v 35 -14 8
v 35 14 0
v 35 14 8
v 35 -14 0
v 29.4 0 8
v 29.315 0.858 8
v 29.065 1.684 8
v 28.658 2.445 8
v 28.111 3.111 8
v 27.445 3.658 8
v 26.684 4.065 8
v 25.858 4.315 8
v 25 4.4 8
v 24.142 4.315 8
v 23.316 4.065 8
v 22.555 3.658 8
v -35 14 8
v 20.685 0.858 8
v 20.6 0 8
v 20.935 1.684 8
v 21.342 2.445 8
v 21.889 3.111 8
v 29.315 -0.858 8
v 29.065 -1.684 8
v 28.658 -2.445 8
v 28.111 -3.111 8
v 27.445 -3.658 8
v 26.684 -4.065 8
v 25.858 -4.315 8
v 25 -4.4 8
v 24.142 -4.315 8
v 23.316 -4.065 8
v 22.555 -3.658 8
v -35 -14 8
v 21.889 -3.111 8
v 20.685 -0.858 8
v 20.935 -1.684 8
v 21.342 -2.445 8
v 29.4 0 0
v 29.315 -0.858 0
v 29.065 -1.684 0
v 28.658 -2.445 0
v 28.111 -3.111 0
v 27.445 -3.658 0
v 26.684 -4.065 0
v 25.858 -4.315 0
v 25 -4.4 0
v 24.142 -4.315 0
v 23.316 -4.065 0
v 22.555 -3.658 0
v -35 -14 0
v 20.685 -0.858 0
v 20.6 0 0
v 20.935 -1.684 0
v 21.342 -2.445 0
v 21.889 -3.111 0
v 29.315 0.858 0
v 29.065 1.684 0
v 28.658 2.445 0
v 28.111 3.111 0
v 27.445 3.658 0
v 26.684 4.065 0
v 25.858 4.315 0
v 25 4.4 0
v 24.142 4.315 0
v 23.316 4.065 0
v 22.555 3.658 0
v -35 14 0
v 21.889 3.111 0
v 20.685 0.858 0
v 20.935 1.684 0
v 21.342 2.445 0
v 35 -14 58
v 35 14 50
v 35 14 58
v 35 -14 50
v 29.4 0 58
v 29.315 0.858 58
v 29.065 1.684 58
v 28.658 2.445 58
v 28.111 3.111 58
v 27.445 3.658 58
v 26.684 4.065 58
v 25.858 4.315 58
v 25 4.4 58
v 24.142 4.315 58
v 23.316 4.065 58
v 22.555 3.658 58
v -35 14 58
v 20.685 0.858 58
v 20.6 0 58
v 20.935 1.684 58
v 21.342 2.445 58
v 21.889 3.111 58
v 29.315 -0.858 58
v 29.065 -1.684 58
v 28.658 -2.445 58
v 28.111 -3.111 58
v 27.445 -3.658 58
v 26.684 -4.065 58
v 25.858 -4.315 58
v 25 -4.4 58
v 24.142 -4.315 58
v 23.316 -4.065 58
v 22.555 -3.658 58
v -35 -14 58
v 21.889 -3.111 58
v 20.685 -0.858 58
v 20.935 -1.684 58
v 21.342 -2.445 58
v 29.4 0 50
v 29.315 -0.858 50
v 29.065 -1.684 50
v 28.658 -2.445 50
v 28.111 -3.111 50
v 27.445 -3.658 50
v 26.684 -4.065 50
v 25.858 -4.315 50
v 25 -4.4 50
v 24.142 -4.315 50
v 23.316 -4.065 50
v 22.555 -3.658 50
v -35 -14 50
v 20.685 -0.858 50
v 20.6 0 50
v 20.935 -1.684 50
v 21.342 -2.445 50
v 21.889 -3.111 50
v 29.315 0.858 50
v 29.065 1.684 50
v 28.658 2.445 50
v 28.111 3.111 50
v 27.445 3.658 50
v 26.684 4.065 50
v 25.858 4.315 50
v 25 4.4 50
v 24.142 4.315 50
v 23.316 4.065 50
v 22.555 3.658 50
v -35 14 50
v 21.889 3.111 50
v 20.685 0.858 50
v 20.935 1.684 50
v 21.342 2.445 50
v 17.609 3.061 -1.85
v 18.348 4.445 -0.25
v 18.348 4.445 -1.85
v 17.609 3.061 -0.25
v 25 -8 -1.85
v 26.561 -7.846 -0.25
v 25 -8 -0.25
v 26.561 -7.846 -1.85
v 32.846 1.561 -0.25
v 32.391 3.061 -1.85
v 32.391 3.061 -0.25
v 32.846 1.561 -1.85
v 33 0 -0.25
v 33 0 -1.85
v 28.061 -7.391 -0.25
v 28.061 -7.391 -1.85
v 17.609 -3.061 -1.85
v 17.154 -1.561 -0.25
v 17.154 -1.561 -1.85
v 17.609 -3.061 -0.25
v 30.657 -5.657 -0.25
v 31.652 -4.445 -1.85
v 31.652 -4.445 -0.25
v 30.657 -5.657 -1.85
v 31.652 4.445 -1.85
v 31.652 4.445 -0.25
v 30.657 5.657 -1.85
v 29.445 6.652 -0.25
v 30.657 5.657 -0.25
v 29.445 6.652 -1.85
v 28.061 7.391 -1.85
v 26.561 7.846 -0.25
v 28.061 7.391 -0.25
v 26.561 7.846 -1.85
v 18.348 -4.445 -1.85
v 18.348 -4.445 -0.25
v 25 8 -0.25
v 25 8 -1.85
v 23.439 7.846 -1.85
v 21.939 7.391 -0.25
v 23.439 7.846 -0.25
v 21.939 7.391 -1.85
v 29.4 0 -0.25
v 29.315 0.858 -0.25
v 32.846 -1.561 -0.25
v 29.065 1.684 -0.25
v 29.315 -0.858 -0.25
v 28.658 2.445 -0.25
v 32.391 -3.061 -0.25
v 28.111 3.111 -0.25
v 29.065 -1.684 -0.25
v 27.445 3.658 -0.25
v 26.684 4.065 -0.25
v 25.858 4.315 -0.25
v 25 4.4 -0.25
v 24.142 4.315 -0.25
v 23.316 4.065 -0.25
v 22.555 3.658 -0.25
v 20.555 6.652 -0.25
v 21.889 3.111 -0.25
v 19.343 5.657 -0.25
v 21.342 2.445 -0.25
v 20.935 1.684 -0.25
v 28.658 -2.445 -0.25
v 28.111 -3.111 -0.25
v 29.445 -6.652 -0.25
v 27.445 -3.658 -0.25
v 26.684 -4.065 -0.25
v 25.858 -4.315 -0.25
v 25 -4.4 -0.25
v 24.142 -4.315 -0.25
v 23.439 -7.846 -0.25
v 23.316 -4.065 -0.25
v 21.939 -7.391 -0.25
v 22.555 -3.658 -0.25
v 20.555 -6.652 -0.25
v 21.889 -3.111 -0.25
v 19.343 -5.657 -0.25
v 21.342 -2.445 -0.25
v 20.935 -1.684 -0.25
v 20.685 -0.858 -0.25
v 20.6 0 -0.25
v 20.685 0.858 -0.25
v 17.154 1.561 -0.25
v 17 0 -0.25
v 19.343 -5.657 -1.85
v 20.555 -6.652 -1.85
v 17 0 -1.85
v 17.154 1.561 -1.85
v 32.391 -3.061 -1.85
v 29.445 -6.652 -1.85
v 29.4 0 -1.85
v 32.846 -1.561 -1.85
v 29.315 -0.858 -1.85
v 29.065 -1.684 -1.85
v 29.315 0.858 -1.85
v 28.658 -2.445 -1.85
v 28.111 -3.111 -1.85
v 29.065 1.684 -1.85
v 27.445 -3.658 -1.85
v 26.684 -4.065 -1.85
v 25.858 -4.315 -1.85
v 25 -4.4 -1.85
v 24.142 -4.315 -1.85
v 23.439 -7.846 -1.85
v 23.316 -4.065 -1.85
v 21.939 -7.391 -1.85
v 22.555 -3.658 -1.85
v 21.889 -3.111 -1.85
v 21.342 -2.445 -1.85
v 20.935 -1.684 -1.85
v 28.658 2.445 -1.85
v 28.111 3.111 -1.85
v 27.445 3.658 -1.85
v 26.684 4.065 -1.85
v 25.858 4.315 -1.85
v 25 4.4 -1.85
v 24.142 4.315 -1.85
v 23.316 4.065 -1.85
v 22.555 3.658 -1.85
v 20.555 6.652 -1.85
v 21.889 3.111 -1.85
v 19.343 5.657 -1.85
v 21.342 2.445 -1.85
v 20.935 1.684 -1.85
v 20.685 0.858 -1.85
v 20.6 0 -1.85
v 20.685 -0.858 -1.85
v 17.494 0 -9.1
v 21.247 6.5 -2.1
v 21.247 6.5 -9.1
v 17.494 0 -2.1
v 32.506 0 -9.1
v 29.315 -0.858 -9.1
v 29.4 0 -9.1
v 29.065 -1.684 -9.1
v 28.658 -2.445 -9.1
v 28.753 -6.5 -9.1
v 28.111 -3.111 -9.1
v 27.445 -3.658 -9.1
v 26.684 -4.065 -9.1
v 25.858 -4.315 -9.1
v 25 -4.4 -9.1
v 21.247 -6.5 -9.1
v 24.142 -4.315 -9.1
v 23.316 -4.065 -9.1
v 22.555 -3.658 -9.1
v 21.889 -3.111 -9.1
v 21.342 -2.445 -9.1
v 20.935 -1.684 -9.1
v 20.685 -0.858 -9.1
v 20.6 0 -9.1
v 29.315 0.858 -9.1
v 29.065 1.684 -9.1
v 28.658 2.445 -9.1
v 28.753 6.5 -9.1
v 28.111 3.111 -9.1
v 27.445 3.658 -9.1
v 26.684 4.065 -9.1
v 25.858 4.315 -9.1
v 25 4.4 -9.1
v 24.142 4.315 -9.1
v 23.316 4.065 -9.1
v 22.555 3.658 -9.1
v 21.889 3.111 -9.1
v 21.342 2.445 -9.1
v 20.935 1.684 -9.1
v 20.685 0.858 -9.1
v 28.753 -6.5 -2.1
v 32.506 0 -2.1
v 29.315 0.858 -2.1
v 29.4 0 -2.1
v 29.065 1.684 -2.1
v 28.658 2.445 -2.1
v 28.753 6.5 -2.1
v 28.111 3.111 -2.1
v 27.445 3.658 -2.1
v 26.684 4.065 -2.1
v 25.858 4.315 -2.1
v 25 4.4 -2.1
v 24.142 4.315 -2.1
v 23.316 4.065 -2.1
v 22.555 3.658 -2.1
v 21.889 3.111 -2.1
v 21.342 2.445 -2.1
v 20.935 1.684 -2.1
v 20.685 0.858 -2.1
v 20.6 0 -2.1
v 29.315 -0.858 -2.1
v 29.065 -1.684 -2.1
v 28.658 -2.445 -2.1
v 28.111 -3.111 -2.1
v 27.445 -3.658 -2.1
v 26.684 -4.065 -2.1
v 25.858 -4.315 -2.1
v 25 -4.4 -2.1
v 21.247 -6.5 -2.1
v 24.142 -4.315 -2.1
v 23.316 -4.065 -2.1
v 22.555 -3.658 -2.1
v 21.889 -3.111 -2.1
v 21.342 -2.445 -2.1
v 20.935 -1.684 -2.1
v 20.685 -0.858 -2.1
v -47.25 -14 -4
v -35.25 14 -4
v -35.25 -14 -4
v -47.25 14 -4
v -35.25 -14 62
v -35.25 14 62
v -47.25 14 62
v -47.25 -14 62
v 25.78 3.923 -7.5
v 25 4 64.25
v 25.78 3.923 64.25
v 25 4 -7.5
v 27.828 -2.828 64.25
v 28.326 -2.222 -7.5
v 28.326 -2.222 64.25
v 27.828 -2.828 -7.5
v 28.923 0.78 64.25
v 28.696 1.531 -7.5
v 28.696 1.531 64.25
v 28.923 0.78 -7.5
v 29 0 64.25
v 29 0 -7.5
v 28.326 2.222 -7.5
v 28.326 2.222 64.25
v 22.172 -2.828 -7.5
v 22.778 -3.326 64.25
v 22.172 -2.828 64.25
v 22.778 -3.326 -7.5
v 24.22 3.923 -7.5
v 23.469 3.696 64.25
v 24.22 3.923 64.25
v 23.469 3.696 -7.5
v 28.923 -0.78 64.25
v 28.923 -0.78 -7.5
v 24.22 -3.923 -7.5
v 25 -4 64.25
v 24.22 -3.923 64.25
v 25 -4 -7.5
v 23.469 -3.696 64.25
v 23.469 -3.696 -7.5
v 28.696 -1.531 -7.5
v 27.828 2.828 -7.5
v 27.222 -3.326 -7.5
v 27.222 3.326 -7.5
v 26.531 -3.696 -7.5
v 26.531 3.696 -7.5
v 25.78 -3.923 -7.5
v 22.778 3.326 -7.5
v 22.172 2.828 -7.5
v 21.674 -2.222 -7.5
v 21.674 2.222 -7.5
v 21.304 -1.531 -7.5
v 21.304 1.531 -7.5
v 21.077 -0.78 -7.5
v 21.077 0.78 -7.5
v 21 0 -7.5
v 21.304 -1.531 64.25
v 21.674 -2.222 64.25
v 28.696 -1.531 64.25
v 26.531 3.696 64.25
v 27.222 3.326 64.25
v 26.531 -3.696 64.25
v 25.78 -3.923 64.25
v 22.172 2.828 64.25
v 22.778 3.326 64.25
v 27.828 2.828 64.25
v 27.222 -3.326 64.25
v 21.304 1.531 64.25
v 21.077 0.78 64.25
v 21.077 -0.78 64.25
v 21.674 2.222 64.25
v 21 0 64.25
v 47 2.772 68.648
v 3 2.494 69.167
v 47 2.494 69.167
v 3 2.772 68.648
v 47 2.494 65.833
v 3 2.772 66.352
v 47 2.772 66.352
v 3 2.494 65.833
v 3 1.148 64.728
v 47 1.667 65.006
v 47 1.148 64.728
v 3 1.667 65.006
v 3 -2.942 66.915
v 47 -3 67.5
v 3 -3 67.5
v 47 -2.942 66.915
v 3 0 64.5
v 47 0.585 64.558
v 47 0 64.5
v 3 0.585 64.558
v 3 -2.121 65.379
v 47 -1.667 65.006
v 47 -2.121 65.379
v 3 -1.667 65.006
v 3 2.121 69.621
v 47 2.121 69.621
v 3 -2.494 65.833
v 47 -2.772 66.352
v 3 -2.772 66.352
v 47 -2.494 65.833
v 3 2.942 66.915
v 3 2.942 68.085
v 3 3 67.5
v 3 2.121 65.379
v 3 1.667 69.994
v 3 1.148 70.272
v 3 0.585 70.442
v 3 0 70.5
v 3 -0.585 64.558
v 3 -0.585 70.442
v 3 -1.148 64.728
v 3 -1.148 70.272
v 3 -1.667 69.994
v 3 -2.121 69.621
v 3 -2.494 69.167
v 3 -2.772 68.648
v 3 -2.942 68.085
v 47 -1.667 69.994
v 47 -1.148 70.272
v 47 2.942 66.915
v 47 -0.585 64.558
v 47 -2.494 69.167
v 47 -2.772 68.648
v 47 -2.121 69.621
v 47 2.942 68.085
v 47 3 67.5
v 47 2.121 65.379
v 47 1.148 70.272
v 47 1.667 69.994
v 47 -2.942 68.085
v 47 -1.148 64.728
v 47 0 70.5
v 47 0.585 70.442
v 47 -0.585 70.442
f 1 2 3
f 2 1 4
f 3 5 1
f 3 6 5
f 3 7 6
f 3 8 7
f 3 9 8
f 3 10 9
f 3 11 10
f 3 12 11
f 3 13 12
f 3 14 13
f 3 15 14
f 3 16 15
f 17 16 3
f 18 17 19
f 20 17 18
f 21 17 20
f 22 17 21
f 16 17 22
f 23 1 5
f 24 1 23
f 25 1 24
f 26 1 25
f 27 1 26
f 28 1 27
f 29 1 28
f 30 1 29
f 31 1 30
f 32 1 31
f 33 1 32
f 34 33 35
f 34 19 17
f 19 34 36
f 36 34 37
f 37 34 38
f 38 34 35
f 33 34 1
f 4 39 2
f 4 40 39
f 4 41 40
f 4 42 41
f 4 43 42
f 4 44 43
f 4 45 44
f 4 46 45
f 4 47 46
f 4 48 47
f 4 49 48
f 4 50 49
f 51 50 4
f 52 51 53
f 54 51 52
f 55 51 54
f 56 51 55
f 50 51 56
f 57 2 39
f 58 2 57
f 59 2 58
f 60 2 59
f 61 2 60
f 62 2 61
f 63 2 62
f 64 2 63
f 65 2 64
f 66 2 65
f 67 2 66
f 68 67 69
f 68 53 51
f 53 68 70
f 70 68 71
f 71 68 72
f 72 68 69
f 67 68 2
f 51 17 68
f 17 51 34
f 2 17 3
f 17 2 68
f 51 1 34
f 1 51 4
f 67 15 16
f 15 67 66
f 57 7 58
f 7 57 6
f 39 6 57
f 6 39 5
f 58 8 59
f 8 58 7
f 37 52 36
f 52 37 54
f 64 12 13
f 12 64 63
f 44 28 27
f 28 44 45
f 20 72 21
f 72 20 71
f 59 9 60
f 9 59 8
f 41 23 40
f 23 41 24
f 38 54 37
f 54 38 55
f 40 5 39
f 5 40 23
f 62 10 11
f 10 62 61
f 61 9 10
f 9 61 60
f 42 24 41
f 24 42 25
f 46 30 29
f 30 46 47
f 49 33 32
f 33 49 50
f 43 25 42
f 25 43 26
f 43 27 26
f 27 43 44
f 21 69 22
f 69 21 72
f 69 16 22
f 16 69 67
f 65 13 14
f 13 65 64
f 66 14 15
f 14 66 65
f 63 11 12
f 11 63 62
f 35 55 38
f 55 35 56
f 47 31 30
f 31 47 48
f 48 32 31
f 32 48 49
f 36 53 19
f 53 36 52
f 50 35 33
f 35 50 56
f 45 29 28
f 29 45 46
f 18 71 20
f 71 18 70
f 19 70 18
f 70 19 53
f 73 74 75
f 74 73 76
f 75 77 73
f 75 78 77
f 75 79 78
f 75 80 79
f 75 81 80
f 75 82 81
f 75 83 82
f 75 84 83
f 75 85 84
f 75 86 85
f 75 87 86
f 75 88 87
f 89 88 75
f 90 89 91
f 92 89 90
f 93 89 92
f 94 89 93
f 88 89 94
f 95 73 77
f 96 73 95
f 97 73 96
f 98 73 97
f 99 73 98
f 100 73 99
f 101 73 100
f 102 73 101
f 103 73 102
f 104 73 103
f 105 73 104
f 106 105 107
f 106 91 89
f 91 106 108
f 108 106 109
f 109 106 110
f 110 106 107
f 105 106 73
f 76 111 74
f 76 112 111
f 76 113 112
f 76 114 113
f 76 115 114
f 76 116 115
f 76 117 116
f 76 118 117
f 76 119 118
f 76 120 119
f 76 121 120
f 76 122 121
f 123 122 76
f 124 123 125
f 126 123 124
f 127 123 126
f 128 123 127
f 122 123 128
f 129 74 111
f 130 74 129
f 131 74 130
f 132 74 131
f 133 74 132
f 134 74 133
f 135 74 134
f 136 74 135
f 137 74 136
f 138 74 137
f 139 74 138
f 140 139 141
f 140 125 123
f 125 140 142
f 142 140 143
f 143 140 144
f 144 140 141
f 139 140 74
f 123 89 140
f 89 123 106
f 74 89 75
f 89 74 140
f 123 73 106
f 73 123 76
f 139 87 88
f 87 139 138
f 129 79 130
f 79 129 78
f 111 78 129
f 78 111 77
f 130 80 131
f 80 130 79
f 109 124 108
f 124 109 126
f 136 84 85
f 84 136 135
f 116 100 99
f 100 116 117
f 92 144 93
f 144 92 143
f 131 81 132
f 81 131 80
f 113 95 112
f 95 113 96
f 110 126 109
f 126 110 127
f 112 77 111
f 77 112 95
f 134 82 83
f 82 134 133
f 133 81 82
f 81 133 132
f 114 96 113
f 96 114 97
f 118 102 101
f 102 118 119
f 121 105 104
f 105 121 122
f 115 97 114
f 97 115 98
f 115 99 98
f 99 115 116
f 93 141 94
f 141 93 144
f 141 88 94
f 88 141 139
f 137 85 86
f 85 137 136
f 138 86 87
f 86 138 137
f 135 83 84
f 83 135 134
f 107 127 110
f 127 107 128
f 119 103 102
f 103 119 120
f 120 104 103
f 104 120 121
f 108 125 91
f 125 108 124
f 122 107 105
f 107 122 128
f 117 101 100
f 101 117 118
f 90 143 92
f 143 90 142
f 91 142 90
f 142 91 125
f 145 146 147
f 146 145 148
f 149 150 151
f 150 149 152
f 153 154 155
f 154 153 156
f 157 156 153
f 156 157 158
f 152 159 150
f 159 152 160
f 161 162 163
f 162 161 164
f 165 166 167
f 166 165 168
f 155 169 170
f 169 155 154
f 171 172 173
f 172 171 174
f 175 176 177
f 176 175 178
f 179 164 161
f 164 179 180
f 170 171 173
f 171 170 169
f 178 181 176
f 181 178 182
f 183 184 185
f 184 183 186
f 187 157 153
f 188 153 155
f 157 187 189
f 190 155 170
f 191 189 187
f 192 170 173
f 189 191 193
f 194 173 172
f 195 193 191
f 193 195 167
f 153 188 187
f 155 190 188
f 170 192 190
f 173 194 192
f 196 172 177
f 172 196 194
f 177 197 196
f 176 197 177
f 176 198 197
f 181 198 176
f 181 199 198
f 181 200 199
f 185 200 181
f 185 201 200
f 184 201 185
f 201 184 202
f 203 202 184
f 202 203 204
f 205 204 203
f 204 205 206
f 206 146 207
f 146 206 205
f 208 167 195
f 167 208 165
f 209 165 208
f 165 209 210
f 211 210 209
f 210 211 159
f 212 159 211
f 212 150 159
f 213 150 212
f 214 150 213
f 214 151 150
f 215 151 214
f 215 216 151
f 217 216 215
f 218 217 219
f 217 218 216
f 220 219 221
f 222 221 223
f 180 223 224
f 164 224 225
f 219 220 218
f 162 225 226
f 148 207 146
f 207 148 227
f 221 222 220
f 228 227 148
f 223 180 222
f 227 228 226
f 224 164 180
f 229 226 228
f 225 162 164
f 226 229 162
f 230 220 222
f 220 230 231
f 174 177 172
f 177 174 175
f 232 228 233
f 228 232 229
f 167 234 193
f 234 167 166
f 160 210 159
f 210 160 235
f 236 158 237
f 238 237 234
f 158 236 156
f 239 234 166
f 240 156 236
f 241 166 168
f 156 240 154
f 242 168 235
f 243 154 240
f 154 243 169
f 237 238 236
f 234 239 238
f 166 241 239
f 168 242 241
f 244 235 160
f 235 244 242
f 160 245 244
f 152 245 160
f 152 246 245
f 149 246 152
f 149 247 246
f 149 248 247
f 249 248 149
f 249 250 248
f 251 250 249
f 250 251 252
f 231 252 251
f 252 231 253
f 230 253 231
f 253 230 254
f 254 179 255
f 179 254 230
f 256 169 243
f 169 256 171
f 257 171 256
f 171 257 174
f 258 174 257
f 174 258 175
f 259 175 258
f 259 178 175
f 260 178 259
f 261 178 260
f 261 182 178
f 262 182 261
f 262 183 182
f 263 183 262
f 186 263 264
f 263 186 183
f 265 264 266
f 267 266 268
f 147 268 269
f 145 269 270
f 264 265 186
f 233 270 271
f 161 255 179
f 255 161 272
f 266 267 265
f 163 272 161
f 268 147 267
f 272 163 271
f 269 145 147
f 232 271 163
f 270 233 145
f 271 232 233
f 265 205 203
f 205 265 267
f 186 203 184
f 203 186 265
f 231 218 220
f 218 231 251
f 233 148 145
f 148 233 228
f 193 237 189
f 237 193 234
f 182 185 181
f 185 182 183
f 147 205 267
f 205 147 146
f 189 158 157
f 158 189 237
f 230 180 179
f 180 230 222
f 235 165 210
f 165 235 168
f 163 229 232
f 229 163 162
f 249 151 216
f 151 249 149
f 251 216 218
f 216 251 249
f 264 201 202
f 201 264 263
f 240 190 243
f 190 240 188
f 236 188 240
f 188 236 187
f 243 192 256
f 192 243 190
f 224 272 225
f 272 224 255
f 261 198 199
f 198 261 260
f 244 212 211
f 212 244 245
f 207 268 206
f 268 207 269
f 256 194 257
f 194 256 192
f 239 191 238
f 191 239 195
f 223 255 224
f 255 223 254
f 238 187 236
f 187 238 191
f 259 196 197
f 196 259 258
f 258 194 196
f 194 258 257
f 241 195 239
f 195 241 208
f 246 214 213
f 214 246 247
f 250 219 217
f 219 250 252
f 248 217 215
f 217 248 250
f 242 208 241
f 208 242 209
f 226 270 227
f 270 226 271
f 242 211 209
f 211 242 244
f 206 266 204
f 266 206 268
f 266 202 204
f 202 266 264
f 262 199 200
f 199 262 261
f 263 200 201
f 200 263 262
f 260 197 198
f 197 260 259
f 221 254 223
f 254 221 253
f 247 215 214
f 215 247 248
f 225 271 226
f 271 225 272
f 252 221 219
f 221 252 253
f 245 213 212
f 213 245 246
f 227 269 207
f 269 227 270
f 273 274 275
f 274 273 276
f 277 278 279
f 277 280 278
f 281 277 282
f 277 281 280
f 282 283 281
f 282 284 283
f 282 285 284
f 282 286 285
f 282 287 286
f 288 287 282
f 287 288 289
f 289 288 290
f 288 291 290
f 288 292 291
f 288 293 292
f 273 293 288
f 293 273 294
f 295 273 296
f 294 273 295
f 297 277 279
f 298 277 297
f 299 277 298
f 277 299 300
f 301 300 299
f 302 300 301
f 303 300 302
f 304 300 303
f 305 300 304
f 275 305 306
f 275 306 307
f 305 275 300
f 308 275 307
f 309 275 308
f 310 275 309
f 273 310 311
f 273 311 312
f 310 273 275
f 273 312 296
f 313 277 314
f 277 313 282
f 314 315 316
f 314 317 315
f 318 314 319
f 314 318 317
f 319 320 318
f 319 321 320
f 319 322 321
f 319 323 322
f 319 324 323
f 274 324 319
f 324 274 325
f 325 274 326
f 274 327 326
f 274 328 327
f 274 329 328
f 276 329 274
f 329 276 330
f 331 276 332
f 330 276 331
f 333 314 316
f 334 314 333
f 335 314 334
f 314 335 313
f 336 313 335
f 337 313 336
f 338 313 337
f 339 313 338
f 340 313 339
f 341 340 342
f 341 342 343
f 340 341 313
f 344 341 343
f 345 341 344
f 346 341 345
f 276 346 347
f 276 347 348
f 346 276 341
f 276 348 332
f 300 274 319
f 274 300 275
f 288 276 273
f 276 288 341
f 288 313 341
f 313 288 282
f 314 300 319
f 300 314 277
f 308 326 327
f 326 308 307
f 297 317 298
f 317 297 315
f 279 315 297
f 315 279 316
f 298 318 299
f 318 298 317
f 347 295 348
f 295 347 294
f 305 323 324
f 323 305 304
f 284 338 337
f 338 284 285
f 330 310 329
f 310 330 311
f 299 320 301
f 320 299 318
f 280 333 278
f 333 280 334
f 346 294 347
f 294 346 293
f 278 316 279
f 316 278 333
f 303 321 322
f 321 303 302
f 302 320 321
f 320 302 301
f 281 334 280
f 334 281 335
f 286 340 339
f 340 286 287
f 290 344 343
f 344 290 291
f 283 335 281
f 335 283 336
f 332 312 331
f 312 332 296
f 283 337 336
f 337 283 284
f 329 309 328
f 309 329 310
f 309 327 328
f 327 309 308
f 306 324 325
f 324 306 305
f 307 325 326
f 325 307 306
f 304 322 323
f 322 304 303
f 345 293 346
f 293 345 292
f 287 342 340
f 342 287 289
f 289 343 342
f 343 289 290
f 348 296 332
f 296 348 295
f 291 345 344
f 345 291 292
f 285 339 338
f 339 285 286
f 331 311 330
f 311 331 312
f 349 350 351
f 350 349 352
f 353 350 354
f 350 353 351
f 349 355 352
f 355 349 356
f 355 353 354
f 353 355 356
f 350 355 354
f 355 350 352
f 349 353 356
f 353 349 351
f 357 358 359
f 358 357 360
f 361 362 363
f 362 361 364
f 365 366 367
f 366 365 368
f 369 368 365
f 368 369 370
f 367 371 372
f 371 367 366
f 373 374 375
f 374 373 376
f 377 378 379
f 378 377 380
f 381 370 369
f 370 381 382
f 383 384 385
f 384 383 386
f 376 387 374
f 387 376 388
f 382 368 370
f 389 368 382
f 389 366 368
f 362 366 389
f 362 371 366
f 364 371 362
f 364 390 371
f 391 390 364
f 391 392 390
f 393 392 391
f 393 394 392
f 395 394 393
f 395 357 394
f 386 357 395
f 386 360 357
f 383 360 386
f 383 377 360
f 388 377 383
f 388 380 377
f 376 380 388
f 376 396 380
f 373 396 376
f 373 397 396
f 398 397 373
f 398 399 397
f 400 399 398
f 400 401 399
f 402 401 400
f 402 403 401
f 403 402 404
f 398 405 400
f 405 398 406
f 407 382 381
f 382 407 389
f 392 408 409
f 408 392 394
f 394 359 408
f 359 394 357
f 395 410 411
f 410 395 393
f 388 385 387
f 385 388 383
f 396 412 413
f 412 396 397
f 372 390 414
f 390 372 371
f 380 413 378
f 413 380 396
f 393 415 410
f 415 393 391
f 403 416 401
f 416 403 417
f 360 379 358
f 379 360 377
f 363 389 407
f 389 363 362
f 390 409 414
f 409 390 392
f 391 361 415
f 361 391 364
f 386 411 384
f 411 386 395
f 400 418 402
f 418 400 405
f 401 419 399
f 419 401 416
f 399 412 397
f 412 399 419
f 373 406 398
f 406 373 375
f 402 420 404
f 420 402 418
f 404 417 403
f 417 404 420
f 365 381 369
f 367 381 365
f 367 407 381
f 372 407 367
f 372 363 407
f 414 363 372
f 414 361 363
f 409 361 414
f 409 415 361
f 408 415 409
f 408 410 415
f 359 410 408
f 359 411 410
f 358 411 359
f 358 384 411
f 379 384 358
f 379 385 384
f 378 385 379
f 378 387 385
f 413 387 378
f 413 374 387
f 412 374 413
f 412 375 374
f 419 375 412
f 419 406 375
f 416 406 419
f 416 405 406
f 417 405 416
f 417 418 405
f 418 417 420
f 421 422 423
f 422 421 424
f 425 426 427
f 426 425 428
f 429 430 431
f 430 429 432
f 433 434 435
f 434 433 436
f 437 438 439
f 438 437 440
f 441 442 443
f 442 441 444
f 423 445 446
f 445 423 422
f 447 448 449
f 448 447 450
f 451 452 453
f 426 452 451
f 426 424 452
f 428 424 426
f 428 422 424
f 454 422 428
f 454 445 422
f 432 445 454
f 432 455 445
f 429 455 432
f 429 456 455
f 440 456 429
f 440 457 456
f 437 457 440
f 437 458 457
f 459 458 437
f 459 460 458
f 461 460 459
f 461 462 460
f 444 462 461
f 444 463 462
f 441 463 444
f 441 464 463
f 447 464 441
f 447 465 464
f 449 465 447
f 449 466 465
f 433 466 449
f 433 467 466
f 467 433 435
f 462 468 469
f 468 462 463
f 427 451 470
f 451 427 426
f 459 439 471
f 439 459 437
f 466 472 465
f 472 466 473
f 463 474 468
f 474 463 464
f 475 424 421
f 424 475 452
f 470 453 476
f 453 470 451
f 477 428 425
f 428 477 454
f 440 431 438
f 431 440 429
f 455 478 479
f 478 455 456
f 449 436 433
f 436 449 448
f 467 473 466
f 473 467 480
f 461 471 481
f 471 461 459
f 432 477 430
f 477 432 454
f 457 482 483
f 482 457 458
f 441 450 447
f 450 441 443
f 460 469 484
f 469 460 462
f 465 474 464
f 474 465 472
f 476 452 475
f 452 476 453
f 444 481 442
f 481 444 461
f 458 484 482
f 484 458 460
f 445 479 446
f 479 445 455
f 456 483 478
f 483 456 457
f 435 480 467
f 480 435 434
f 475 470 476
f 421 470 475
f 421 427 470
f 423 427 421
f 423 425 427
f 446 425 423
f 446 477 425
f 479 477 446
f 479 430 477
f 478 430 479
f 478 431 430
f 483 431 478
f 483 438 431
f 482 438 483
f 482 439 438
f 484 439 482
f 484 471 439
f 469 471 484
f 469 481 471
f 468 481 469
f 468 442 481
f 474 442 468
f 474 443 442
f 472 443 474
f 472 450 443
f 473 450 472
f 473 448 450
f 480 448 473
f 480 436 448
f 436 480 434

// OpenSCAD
$fn = 32;

// ------------------------------------------------------------------------
// C clamp: throat 50 mm, screw d8
// Every part is its own module, assembly() places every instance.
// ------------------------------------------------------------------------

// --- part 1 ---
module clamp_arm() {
  difference() {
    translate([-35, -14, 0]) cube([70, 28, 8]);
    translate([25, 0, -1]) cylinder(h = 10, d = 8.8);
  }
}

// --- part 2 ---
module clamp_spine() {
  difference() {
    translate([-33, -14, 0]) cube([66, 28, 12]);
  }
}

// --- part 3 ---
module clamp_screw() {
  translate([0, 0, -35.875]) cylinder(h = 71.75, d = 8);
}

// --- part 4 ---
module clamp_washer() {
  difference() {
      translate([0, 0, 0]) cylinder(h = 1.6, d = 16);
      translate([0, 0, -1]) cylinder(h = 3.6, d = 8.8);
    }
}

// --- part 5 ---
module clamp_nut() {
  difference() {
    linear_extrude(height = 7) polygon(points = [[7.506, 0], [3.753, 6.5], [-3.753, 6.5], [-7.506, 0], [-3.753, -6.5], [3.753, -6.5]]);
    translate([0, 0, -1]) cylinder(h = 9, d = 8.8);
  }
}

// --- part 6 ---
module tommy_bar() {
  translate([0, 0, -22]) cylinder(h = 44, d = 6);
}

// --- assembly ---
module assembly() {
  color([0.80, 0.24, 0.20]) translate([0, 0, 0]) rotate([0, 0, 0]) clamp_arm();
  color([0.20, 0.45, 0.75]) translate([0, 0, 50]) rotate([0, 0, 0]) clamp_arm();
  color([0.25, 0.62, 0.32]) translate([-47.25, 0, 29]) rotate([0, 90, 0]) clamp_spine();
  color([0.92, 0.70, 0.18]) translate([25, 0, 28.375]) rotate([0, 0, 0]) clamp_screw();
  color([0.58, 0.35, 0.70]) translate([25, 0, -1.85]) rotate([0, 0, 0]) clamp_washer();
  color([0.16, 0.66, 0.66]) translate([25, 0, -9.1]) rotate([0, 0, 0]) clamp_nut();
  color([0.85, 0.48, 0.18]) translate([25, 0, 67.5]) rotate([0, 90, 0]) tommy_bar();
}

assembly();
